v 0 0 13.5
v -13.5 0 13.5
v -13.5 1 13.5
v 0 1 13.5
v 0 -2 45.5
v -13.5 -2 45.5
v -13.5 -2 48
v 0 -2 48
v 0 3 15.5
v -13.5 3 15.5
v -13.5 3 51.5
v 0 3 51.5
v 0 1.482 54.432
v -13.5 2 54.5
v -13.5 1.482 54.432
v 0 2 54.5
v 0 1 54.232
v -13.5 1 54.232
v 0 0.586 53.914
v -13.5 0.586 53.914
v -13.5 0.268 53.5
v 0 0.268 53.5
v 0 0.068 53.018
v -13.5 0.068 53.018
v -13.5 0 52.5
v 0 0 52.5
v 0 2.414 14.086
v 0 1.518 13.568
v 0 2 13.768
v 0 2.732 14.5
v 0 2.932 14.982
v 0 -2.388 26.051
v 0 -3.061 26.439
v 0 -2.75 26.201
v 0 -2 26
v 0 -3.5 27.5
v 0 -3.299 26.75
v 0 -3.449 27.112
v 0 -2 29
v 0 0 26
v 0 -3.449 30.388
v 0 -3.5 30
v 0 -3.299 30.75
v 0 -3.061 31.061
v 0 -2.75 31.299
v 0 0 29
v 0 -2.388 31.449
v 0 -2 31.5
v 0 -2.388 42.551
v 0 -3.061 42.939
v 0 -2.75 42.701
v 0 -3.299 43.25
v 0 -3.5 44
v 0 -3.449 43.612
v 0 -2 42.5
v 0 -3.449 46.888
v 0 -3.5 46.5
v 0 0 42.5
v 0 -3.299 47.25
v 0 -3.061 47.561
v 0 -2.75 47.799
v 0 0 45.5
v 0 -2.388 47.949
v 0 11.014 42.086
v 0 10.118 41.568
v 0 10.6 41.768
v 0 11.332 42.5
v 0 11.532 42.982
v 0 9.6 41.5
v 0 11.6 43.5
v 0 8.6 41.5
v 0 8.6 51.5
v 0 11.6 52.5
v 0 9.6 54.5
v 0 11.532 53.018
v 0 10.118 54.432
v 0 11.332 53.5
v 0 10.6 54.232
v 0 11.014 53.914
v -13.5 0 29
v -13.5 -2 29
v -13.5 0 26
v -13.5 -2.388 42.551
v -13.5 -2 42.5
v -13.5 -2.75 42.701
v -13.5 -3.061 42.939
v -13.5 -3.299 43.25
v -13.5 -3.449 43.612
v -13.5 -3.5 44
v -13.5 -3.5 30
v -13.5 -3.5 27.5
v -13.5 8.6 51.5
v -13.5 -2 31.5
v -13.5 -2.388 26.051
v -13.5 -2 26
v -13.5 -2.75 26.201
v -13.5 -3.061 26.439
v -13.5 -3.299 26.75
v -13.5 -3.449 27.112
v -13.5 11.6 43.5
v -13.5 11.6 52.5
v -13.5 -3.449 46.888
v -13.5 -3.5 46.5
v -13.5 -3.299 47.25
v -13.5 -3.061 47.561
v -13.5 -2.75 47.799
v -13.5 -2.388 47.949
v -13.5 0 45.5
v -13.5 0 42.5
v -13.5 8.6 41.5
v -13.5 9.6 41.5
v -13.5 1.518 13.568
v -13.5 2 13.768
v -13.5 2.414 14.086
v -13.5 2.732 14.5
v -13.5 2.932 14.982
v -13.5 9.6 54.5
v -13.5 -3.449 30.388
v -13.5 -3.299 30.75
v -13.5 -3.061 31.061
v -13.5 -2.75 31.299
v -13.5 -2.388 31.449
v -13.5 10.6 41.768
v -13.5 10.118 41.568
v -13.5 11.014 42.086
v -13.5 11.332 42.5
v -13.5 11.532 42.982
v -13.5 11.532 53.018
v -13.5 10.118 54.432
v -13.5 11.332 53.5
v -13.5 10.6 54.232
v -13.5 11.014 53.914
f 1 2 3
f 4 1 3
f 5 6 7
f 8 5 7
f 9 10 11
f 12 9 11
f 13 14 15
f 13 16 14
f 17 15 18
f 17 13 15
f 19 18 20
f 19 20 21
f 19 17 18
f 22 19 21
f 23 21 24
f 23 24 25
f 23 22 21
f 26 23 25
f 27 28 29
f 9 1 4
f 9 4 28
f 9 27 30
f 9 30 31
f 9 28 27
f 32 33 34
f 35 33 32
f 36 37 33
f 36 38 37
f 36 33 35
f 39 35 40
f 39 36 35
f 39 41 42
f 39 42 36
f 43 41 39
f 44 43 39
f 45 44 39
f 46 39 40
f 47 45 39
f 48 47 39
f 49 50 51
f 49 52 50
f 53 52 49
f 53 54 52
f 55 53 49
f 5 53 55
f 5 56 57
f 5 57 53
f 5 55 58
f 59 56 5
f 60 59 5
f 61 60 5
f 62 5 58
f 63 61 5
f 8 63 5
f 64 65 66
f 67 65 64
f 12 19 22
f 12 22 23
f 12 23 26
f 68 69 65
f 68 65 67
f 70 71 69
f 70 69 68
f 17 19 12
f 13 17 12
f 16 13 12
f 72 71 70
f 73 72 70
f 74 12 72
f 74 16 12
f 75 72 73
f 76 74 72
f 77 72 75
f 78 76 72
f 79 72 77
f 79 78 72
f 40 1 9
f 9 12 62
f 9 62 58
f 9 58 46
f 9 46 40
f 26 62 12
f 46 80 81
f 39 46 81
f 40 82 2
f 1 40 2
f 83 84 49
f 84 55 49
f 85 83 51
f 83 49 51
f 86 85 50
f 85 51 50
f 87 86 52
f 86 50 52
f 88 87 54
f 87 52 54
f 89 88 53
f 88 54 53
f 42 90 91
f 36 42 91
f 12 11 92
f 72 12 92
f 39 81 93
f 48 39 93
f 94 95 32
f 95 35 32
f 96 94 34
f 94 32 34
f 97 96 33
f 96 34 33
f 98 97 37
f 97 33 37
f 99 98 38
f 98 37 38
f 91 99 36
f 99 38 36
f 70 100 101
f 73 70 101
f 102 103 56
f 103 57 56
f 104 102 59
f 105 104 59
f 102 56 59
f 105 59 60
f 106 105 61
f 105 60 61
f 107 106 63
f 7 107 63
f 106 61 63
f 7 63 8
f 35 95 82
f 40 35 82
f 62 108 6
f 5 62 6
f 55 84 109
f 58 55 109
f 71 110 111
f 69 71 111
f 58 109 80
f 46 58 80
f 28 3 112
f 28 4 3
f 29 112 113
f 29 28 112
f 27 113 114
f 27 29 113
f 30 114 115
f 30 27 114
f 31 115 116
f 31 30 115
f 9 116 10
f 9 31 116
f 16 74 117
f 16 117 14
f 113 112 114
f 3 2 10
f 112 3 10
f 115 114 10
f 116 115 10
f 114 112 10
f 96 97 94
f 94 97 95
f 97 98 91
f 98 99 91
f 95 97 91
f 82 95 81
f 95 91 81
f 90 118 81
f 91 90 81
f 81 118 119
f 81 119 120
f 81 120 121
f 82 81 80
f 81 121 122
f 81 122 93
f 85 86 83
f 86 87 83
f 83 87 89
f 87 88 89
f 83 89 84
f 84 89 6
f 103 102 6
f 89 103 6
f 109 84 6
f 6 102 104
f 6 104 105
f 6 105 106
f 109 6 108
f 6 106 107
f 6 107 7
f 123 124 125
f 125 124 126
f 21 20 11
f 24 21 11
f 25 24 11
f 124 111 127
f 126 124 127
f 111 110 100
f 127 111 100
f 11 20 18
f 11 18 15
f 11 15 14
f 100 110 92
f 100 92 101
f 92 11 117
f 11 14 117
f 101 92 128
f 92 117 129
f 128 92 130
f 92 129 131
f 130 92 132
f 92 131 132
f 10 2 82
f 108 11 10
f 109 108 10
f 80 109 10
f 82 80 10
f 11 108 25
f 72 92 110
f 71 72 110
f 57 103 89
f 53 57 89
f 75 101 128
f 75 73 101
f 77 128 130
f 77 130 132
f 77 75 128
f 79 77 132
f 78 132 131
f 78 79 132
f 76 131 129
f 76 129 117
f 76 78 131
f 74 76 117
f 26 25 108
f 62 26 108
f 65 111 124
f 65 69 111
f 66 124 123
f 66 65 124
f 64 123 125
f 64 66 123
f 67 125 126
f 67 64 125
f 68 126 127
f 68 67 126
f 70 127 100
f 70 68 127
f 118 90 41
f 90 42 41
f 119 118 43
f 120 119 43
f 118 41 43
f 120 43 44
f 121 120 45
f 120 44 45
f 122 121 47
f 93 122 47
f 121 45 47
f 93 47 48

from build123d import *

# Parameters (mm, degrees)
F1_DEPTH = 13.5
F2_R     = 2
F3_R     = 1.49999
F4_ANGLE = 90
F5_ANGLE = 270


# Not quite as in the source:
# - a fillet or chamfer is up to 0.001 mm smaller than in the source, because OpenCascade refuses the exact size


with BuildPart() as f1:
    # F0 (on Top) → F1 (new body)
    with BuildSketch(Plane.XY):
        Polygon((0, 12.5), (0, 0), (3, 0), (3, 38), (8.6, 38), (8.6, 28), (11.6, 28), (11.6, 41), (0, 41), (0, 32), (-2, 32), (-2, 34.5), (-3.5, 34.5), (-3.5, 29), (0, 29), (0, 15.5), (-2, 15.5), (-2, 18), (-3.5, 18), (-3.5, 12.5), align=None)
    extrude(amount=F1_DEPTH)

    # F2
    f2_edges = [f1.edges().sort_by_distance(p)[0] for p in [
        (0, 41, 6.75),
        (11.6, 41, 6.75),
        (11.6, 28, 6.75),
        (3, 0, 6.75),
    ]]
    fillet(f2_edges, radius=F2_R)

    # F3 (radius 1.5 in the source; OpenCascade refuses exactly that, so slightly less here)
    f3_edges = [f1.edges().sort_by_distance(p)[0] for p in [
        (-3.5, 34.5, 6.75),
        (-3.5, 29, 6.75),
        (-3.5, 18, 6.75),
        (-3.5, 12.5, 6.75),
    ]]
    fillet(f3_edges, radius=F3_R)


with BuildPart() as f1_1:
    # F4: moved
    add(f1.part.rotate(Axis((0, 6.25, 13.5), (0, 1, 0)), F4_ANGLE))


with BuildPart() as f1_2:
    # F5: moved
    add(f1_1.part.rotate(Axis((-6.75, 0, 13.5), (-1, 0, 0)), F5_ANGLE))


solid = f1_2.part
